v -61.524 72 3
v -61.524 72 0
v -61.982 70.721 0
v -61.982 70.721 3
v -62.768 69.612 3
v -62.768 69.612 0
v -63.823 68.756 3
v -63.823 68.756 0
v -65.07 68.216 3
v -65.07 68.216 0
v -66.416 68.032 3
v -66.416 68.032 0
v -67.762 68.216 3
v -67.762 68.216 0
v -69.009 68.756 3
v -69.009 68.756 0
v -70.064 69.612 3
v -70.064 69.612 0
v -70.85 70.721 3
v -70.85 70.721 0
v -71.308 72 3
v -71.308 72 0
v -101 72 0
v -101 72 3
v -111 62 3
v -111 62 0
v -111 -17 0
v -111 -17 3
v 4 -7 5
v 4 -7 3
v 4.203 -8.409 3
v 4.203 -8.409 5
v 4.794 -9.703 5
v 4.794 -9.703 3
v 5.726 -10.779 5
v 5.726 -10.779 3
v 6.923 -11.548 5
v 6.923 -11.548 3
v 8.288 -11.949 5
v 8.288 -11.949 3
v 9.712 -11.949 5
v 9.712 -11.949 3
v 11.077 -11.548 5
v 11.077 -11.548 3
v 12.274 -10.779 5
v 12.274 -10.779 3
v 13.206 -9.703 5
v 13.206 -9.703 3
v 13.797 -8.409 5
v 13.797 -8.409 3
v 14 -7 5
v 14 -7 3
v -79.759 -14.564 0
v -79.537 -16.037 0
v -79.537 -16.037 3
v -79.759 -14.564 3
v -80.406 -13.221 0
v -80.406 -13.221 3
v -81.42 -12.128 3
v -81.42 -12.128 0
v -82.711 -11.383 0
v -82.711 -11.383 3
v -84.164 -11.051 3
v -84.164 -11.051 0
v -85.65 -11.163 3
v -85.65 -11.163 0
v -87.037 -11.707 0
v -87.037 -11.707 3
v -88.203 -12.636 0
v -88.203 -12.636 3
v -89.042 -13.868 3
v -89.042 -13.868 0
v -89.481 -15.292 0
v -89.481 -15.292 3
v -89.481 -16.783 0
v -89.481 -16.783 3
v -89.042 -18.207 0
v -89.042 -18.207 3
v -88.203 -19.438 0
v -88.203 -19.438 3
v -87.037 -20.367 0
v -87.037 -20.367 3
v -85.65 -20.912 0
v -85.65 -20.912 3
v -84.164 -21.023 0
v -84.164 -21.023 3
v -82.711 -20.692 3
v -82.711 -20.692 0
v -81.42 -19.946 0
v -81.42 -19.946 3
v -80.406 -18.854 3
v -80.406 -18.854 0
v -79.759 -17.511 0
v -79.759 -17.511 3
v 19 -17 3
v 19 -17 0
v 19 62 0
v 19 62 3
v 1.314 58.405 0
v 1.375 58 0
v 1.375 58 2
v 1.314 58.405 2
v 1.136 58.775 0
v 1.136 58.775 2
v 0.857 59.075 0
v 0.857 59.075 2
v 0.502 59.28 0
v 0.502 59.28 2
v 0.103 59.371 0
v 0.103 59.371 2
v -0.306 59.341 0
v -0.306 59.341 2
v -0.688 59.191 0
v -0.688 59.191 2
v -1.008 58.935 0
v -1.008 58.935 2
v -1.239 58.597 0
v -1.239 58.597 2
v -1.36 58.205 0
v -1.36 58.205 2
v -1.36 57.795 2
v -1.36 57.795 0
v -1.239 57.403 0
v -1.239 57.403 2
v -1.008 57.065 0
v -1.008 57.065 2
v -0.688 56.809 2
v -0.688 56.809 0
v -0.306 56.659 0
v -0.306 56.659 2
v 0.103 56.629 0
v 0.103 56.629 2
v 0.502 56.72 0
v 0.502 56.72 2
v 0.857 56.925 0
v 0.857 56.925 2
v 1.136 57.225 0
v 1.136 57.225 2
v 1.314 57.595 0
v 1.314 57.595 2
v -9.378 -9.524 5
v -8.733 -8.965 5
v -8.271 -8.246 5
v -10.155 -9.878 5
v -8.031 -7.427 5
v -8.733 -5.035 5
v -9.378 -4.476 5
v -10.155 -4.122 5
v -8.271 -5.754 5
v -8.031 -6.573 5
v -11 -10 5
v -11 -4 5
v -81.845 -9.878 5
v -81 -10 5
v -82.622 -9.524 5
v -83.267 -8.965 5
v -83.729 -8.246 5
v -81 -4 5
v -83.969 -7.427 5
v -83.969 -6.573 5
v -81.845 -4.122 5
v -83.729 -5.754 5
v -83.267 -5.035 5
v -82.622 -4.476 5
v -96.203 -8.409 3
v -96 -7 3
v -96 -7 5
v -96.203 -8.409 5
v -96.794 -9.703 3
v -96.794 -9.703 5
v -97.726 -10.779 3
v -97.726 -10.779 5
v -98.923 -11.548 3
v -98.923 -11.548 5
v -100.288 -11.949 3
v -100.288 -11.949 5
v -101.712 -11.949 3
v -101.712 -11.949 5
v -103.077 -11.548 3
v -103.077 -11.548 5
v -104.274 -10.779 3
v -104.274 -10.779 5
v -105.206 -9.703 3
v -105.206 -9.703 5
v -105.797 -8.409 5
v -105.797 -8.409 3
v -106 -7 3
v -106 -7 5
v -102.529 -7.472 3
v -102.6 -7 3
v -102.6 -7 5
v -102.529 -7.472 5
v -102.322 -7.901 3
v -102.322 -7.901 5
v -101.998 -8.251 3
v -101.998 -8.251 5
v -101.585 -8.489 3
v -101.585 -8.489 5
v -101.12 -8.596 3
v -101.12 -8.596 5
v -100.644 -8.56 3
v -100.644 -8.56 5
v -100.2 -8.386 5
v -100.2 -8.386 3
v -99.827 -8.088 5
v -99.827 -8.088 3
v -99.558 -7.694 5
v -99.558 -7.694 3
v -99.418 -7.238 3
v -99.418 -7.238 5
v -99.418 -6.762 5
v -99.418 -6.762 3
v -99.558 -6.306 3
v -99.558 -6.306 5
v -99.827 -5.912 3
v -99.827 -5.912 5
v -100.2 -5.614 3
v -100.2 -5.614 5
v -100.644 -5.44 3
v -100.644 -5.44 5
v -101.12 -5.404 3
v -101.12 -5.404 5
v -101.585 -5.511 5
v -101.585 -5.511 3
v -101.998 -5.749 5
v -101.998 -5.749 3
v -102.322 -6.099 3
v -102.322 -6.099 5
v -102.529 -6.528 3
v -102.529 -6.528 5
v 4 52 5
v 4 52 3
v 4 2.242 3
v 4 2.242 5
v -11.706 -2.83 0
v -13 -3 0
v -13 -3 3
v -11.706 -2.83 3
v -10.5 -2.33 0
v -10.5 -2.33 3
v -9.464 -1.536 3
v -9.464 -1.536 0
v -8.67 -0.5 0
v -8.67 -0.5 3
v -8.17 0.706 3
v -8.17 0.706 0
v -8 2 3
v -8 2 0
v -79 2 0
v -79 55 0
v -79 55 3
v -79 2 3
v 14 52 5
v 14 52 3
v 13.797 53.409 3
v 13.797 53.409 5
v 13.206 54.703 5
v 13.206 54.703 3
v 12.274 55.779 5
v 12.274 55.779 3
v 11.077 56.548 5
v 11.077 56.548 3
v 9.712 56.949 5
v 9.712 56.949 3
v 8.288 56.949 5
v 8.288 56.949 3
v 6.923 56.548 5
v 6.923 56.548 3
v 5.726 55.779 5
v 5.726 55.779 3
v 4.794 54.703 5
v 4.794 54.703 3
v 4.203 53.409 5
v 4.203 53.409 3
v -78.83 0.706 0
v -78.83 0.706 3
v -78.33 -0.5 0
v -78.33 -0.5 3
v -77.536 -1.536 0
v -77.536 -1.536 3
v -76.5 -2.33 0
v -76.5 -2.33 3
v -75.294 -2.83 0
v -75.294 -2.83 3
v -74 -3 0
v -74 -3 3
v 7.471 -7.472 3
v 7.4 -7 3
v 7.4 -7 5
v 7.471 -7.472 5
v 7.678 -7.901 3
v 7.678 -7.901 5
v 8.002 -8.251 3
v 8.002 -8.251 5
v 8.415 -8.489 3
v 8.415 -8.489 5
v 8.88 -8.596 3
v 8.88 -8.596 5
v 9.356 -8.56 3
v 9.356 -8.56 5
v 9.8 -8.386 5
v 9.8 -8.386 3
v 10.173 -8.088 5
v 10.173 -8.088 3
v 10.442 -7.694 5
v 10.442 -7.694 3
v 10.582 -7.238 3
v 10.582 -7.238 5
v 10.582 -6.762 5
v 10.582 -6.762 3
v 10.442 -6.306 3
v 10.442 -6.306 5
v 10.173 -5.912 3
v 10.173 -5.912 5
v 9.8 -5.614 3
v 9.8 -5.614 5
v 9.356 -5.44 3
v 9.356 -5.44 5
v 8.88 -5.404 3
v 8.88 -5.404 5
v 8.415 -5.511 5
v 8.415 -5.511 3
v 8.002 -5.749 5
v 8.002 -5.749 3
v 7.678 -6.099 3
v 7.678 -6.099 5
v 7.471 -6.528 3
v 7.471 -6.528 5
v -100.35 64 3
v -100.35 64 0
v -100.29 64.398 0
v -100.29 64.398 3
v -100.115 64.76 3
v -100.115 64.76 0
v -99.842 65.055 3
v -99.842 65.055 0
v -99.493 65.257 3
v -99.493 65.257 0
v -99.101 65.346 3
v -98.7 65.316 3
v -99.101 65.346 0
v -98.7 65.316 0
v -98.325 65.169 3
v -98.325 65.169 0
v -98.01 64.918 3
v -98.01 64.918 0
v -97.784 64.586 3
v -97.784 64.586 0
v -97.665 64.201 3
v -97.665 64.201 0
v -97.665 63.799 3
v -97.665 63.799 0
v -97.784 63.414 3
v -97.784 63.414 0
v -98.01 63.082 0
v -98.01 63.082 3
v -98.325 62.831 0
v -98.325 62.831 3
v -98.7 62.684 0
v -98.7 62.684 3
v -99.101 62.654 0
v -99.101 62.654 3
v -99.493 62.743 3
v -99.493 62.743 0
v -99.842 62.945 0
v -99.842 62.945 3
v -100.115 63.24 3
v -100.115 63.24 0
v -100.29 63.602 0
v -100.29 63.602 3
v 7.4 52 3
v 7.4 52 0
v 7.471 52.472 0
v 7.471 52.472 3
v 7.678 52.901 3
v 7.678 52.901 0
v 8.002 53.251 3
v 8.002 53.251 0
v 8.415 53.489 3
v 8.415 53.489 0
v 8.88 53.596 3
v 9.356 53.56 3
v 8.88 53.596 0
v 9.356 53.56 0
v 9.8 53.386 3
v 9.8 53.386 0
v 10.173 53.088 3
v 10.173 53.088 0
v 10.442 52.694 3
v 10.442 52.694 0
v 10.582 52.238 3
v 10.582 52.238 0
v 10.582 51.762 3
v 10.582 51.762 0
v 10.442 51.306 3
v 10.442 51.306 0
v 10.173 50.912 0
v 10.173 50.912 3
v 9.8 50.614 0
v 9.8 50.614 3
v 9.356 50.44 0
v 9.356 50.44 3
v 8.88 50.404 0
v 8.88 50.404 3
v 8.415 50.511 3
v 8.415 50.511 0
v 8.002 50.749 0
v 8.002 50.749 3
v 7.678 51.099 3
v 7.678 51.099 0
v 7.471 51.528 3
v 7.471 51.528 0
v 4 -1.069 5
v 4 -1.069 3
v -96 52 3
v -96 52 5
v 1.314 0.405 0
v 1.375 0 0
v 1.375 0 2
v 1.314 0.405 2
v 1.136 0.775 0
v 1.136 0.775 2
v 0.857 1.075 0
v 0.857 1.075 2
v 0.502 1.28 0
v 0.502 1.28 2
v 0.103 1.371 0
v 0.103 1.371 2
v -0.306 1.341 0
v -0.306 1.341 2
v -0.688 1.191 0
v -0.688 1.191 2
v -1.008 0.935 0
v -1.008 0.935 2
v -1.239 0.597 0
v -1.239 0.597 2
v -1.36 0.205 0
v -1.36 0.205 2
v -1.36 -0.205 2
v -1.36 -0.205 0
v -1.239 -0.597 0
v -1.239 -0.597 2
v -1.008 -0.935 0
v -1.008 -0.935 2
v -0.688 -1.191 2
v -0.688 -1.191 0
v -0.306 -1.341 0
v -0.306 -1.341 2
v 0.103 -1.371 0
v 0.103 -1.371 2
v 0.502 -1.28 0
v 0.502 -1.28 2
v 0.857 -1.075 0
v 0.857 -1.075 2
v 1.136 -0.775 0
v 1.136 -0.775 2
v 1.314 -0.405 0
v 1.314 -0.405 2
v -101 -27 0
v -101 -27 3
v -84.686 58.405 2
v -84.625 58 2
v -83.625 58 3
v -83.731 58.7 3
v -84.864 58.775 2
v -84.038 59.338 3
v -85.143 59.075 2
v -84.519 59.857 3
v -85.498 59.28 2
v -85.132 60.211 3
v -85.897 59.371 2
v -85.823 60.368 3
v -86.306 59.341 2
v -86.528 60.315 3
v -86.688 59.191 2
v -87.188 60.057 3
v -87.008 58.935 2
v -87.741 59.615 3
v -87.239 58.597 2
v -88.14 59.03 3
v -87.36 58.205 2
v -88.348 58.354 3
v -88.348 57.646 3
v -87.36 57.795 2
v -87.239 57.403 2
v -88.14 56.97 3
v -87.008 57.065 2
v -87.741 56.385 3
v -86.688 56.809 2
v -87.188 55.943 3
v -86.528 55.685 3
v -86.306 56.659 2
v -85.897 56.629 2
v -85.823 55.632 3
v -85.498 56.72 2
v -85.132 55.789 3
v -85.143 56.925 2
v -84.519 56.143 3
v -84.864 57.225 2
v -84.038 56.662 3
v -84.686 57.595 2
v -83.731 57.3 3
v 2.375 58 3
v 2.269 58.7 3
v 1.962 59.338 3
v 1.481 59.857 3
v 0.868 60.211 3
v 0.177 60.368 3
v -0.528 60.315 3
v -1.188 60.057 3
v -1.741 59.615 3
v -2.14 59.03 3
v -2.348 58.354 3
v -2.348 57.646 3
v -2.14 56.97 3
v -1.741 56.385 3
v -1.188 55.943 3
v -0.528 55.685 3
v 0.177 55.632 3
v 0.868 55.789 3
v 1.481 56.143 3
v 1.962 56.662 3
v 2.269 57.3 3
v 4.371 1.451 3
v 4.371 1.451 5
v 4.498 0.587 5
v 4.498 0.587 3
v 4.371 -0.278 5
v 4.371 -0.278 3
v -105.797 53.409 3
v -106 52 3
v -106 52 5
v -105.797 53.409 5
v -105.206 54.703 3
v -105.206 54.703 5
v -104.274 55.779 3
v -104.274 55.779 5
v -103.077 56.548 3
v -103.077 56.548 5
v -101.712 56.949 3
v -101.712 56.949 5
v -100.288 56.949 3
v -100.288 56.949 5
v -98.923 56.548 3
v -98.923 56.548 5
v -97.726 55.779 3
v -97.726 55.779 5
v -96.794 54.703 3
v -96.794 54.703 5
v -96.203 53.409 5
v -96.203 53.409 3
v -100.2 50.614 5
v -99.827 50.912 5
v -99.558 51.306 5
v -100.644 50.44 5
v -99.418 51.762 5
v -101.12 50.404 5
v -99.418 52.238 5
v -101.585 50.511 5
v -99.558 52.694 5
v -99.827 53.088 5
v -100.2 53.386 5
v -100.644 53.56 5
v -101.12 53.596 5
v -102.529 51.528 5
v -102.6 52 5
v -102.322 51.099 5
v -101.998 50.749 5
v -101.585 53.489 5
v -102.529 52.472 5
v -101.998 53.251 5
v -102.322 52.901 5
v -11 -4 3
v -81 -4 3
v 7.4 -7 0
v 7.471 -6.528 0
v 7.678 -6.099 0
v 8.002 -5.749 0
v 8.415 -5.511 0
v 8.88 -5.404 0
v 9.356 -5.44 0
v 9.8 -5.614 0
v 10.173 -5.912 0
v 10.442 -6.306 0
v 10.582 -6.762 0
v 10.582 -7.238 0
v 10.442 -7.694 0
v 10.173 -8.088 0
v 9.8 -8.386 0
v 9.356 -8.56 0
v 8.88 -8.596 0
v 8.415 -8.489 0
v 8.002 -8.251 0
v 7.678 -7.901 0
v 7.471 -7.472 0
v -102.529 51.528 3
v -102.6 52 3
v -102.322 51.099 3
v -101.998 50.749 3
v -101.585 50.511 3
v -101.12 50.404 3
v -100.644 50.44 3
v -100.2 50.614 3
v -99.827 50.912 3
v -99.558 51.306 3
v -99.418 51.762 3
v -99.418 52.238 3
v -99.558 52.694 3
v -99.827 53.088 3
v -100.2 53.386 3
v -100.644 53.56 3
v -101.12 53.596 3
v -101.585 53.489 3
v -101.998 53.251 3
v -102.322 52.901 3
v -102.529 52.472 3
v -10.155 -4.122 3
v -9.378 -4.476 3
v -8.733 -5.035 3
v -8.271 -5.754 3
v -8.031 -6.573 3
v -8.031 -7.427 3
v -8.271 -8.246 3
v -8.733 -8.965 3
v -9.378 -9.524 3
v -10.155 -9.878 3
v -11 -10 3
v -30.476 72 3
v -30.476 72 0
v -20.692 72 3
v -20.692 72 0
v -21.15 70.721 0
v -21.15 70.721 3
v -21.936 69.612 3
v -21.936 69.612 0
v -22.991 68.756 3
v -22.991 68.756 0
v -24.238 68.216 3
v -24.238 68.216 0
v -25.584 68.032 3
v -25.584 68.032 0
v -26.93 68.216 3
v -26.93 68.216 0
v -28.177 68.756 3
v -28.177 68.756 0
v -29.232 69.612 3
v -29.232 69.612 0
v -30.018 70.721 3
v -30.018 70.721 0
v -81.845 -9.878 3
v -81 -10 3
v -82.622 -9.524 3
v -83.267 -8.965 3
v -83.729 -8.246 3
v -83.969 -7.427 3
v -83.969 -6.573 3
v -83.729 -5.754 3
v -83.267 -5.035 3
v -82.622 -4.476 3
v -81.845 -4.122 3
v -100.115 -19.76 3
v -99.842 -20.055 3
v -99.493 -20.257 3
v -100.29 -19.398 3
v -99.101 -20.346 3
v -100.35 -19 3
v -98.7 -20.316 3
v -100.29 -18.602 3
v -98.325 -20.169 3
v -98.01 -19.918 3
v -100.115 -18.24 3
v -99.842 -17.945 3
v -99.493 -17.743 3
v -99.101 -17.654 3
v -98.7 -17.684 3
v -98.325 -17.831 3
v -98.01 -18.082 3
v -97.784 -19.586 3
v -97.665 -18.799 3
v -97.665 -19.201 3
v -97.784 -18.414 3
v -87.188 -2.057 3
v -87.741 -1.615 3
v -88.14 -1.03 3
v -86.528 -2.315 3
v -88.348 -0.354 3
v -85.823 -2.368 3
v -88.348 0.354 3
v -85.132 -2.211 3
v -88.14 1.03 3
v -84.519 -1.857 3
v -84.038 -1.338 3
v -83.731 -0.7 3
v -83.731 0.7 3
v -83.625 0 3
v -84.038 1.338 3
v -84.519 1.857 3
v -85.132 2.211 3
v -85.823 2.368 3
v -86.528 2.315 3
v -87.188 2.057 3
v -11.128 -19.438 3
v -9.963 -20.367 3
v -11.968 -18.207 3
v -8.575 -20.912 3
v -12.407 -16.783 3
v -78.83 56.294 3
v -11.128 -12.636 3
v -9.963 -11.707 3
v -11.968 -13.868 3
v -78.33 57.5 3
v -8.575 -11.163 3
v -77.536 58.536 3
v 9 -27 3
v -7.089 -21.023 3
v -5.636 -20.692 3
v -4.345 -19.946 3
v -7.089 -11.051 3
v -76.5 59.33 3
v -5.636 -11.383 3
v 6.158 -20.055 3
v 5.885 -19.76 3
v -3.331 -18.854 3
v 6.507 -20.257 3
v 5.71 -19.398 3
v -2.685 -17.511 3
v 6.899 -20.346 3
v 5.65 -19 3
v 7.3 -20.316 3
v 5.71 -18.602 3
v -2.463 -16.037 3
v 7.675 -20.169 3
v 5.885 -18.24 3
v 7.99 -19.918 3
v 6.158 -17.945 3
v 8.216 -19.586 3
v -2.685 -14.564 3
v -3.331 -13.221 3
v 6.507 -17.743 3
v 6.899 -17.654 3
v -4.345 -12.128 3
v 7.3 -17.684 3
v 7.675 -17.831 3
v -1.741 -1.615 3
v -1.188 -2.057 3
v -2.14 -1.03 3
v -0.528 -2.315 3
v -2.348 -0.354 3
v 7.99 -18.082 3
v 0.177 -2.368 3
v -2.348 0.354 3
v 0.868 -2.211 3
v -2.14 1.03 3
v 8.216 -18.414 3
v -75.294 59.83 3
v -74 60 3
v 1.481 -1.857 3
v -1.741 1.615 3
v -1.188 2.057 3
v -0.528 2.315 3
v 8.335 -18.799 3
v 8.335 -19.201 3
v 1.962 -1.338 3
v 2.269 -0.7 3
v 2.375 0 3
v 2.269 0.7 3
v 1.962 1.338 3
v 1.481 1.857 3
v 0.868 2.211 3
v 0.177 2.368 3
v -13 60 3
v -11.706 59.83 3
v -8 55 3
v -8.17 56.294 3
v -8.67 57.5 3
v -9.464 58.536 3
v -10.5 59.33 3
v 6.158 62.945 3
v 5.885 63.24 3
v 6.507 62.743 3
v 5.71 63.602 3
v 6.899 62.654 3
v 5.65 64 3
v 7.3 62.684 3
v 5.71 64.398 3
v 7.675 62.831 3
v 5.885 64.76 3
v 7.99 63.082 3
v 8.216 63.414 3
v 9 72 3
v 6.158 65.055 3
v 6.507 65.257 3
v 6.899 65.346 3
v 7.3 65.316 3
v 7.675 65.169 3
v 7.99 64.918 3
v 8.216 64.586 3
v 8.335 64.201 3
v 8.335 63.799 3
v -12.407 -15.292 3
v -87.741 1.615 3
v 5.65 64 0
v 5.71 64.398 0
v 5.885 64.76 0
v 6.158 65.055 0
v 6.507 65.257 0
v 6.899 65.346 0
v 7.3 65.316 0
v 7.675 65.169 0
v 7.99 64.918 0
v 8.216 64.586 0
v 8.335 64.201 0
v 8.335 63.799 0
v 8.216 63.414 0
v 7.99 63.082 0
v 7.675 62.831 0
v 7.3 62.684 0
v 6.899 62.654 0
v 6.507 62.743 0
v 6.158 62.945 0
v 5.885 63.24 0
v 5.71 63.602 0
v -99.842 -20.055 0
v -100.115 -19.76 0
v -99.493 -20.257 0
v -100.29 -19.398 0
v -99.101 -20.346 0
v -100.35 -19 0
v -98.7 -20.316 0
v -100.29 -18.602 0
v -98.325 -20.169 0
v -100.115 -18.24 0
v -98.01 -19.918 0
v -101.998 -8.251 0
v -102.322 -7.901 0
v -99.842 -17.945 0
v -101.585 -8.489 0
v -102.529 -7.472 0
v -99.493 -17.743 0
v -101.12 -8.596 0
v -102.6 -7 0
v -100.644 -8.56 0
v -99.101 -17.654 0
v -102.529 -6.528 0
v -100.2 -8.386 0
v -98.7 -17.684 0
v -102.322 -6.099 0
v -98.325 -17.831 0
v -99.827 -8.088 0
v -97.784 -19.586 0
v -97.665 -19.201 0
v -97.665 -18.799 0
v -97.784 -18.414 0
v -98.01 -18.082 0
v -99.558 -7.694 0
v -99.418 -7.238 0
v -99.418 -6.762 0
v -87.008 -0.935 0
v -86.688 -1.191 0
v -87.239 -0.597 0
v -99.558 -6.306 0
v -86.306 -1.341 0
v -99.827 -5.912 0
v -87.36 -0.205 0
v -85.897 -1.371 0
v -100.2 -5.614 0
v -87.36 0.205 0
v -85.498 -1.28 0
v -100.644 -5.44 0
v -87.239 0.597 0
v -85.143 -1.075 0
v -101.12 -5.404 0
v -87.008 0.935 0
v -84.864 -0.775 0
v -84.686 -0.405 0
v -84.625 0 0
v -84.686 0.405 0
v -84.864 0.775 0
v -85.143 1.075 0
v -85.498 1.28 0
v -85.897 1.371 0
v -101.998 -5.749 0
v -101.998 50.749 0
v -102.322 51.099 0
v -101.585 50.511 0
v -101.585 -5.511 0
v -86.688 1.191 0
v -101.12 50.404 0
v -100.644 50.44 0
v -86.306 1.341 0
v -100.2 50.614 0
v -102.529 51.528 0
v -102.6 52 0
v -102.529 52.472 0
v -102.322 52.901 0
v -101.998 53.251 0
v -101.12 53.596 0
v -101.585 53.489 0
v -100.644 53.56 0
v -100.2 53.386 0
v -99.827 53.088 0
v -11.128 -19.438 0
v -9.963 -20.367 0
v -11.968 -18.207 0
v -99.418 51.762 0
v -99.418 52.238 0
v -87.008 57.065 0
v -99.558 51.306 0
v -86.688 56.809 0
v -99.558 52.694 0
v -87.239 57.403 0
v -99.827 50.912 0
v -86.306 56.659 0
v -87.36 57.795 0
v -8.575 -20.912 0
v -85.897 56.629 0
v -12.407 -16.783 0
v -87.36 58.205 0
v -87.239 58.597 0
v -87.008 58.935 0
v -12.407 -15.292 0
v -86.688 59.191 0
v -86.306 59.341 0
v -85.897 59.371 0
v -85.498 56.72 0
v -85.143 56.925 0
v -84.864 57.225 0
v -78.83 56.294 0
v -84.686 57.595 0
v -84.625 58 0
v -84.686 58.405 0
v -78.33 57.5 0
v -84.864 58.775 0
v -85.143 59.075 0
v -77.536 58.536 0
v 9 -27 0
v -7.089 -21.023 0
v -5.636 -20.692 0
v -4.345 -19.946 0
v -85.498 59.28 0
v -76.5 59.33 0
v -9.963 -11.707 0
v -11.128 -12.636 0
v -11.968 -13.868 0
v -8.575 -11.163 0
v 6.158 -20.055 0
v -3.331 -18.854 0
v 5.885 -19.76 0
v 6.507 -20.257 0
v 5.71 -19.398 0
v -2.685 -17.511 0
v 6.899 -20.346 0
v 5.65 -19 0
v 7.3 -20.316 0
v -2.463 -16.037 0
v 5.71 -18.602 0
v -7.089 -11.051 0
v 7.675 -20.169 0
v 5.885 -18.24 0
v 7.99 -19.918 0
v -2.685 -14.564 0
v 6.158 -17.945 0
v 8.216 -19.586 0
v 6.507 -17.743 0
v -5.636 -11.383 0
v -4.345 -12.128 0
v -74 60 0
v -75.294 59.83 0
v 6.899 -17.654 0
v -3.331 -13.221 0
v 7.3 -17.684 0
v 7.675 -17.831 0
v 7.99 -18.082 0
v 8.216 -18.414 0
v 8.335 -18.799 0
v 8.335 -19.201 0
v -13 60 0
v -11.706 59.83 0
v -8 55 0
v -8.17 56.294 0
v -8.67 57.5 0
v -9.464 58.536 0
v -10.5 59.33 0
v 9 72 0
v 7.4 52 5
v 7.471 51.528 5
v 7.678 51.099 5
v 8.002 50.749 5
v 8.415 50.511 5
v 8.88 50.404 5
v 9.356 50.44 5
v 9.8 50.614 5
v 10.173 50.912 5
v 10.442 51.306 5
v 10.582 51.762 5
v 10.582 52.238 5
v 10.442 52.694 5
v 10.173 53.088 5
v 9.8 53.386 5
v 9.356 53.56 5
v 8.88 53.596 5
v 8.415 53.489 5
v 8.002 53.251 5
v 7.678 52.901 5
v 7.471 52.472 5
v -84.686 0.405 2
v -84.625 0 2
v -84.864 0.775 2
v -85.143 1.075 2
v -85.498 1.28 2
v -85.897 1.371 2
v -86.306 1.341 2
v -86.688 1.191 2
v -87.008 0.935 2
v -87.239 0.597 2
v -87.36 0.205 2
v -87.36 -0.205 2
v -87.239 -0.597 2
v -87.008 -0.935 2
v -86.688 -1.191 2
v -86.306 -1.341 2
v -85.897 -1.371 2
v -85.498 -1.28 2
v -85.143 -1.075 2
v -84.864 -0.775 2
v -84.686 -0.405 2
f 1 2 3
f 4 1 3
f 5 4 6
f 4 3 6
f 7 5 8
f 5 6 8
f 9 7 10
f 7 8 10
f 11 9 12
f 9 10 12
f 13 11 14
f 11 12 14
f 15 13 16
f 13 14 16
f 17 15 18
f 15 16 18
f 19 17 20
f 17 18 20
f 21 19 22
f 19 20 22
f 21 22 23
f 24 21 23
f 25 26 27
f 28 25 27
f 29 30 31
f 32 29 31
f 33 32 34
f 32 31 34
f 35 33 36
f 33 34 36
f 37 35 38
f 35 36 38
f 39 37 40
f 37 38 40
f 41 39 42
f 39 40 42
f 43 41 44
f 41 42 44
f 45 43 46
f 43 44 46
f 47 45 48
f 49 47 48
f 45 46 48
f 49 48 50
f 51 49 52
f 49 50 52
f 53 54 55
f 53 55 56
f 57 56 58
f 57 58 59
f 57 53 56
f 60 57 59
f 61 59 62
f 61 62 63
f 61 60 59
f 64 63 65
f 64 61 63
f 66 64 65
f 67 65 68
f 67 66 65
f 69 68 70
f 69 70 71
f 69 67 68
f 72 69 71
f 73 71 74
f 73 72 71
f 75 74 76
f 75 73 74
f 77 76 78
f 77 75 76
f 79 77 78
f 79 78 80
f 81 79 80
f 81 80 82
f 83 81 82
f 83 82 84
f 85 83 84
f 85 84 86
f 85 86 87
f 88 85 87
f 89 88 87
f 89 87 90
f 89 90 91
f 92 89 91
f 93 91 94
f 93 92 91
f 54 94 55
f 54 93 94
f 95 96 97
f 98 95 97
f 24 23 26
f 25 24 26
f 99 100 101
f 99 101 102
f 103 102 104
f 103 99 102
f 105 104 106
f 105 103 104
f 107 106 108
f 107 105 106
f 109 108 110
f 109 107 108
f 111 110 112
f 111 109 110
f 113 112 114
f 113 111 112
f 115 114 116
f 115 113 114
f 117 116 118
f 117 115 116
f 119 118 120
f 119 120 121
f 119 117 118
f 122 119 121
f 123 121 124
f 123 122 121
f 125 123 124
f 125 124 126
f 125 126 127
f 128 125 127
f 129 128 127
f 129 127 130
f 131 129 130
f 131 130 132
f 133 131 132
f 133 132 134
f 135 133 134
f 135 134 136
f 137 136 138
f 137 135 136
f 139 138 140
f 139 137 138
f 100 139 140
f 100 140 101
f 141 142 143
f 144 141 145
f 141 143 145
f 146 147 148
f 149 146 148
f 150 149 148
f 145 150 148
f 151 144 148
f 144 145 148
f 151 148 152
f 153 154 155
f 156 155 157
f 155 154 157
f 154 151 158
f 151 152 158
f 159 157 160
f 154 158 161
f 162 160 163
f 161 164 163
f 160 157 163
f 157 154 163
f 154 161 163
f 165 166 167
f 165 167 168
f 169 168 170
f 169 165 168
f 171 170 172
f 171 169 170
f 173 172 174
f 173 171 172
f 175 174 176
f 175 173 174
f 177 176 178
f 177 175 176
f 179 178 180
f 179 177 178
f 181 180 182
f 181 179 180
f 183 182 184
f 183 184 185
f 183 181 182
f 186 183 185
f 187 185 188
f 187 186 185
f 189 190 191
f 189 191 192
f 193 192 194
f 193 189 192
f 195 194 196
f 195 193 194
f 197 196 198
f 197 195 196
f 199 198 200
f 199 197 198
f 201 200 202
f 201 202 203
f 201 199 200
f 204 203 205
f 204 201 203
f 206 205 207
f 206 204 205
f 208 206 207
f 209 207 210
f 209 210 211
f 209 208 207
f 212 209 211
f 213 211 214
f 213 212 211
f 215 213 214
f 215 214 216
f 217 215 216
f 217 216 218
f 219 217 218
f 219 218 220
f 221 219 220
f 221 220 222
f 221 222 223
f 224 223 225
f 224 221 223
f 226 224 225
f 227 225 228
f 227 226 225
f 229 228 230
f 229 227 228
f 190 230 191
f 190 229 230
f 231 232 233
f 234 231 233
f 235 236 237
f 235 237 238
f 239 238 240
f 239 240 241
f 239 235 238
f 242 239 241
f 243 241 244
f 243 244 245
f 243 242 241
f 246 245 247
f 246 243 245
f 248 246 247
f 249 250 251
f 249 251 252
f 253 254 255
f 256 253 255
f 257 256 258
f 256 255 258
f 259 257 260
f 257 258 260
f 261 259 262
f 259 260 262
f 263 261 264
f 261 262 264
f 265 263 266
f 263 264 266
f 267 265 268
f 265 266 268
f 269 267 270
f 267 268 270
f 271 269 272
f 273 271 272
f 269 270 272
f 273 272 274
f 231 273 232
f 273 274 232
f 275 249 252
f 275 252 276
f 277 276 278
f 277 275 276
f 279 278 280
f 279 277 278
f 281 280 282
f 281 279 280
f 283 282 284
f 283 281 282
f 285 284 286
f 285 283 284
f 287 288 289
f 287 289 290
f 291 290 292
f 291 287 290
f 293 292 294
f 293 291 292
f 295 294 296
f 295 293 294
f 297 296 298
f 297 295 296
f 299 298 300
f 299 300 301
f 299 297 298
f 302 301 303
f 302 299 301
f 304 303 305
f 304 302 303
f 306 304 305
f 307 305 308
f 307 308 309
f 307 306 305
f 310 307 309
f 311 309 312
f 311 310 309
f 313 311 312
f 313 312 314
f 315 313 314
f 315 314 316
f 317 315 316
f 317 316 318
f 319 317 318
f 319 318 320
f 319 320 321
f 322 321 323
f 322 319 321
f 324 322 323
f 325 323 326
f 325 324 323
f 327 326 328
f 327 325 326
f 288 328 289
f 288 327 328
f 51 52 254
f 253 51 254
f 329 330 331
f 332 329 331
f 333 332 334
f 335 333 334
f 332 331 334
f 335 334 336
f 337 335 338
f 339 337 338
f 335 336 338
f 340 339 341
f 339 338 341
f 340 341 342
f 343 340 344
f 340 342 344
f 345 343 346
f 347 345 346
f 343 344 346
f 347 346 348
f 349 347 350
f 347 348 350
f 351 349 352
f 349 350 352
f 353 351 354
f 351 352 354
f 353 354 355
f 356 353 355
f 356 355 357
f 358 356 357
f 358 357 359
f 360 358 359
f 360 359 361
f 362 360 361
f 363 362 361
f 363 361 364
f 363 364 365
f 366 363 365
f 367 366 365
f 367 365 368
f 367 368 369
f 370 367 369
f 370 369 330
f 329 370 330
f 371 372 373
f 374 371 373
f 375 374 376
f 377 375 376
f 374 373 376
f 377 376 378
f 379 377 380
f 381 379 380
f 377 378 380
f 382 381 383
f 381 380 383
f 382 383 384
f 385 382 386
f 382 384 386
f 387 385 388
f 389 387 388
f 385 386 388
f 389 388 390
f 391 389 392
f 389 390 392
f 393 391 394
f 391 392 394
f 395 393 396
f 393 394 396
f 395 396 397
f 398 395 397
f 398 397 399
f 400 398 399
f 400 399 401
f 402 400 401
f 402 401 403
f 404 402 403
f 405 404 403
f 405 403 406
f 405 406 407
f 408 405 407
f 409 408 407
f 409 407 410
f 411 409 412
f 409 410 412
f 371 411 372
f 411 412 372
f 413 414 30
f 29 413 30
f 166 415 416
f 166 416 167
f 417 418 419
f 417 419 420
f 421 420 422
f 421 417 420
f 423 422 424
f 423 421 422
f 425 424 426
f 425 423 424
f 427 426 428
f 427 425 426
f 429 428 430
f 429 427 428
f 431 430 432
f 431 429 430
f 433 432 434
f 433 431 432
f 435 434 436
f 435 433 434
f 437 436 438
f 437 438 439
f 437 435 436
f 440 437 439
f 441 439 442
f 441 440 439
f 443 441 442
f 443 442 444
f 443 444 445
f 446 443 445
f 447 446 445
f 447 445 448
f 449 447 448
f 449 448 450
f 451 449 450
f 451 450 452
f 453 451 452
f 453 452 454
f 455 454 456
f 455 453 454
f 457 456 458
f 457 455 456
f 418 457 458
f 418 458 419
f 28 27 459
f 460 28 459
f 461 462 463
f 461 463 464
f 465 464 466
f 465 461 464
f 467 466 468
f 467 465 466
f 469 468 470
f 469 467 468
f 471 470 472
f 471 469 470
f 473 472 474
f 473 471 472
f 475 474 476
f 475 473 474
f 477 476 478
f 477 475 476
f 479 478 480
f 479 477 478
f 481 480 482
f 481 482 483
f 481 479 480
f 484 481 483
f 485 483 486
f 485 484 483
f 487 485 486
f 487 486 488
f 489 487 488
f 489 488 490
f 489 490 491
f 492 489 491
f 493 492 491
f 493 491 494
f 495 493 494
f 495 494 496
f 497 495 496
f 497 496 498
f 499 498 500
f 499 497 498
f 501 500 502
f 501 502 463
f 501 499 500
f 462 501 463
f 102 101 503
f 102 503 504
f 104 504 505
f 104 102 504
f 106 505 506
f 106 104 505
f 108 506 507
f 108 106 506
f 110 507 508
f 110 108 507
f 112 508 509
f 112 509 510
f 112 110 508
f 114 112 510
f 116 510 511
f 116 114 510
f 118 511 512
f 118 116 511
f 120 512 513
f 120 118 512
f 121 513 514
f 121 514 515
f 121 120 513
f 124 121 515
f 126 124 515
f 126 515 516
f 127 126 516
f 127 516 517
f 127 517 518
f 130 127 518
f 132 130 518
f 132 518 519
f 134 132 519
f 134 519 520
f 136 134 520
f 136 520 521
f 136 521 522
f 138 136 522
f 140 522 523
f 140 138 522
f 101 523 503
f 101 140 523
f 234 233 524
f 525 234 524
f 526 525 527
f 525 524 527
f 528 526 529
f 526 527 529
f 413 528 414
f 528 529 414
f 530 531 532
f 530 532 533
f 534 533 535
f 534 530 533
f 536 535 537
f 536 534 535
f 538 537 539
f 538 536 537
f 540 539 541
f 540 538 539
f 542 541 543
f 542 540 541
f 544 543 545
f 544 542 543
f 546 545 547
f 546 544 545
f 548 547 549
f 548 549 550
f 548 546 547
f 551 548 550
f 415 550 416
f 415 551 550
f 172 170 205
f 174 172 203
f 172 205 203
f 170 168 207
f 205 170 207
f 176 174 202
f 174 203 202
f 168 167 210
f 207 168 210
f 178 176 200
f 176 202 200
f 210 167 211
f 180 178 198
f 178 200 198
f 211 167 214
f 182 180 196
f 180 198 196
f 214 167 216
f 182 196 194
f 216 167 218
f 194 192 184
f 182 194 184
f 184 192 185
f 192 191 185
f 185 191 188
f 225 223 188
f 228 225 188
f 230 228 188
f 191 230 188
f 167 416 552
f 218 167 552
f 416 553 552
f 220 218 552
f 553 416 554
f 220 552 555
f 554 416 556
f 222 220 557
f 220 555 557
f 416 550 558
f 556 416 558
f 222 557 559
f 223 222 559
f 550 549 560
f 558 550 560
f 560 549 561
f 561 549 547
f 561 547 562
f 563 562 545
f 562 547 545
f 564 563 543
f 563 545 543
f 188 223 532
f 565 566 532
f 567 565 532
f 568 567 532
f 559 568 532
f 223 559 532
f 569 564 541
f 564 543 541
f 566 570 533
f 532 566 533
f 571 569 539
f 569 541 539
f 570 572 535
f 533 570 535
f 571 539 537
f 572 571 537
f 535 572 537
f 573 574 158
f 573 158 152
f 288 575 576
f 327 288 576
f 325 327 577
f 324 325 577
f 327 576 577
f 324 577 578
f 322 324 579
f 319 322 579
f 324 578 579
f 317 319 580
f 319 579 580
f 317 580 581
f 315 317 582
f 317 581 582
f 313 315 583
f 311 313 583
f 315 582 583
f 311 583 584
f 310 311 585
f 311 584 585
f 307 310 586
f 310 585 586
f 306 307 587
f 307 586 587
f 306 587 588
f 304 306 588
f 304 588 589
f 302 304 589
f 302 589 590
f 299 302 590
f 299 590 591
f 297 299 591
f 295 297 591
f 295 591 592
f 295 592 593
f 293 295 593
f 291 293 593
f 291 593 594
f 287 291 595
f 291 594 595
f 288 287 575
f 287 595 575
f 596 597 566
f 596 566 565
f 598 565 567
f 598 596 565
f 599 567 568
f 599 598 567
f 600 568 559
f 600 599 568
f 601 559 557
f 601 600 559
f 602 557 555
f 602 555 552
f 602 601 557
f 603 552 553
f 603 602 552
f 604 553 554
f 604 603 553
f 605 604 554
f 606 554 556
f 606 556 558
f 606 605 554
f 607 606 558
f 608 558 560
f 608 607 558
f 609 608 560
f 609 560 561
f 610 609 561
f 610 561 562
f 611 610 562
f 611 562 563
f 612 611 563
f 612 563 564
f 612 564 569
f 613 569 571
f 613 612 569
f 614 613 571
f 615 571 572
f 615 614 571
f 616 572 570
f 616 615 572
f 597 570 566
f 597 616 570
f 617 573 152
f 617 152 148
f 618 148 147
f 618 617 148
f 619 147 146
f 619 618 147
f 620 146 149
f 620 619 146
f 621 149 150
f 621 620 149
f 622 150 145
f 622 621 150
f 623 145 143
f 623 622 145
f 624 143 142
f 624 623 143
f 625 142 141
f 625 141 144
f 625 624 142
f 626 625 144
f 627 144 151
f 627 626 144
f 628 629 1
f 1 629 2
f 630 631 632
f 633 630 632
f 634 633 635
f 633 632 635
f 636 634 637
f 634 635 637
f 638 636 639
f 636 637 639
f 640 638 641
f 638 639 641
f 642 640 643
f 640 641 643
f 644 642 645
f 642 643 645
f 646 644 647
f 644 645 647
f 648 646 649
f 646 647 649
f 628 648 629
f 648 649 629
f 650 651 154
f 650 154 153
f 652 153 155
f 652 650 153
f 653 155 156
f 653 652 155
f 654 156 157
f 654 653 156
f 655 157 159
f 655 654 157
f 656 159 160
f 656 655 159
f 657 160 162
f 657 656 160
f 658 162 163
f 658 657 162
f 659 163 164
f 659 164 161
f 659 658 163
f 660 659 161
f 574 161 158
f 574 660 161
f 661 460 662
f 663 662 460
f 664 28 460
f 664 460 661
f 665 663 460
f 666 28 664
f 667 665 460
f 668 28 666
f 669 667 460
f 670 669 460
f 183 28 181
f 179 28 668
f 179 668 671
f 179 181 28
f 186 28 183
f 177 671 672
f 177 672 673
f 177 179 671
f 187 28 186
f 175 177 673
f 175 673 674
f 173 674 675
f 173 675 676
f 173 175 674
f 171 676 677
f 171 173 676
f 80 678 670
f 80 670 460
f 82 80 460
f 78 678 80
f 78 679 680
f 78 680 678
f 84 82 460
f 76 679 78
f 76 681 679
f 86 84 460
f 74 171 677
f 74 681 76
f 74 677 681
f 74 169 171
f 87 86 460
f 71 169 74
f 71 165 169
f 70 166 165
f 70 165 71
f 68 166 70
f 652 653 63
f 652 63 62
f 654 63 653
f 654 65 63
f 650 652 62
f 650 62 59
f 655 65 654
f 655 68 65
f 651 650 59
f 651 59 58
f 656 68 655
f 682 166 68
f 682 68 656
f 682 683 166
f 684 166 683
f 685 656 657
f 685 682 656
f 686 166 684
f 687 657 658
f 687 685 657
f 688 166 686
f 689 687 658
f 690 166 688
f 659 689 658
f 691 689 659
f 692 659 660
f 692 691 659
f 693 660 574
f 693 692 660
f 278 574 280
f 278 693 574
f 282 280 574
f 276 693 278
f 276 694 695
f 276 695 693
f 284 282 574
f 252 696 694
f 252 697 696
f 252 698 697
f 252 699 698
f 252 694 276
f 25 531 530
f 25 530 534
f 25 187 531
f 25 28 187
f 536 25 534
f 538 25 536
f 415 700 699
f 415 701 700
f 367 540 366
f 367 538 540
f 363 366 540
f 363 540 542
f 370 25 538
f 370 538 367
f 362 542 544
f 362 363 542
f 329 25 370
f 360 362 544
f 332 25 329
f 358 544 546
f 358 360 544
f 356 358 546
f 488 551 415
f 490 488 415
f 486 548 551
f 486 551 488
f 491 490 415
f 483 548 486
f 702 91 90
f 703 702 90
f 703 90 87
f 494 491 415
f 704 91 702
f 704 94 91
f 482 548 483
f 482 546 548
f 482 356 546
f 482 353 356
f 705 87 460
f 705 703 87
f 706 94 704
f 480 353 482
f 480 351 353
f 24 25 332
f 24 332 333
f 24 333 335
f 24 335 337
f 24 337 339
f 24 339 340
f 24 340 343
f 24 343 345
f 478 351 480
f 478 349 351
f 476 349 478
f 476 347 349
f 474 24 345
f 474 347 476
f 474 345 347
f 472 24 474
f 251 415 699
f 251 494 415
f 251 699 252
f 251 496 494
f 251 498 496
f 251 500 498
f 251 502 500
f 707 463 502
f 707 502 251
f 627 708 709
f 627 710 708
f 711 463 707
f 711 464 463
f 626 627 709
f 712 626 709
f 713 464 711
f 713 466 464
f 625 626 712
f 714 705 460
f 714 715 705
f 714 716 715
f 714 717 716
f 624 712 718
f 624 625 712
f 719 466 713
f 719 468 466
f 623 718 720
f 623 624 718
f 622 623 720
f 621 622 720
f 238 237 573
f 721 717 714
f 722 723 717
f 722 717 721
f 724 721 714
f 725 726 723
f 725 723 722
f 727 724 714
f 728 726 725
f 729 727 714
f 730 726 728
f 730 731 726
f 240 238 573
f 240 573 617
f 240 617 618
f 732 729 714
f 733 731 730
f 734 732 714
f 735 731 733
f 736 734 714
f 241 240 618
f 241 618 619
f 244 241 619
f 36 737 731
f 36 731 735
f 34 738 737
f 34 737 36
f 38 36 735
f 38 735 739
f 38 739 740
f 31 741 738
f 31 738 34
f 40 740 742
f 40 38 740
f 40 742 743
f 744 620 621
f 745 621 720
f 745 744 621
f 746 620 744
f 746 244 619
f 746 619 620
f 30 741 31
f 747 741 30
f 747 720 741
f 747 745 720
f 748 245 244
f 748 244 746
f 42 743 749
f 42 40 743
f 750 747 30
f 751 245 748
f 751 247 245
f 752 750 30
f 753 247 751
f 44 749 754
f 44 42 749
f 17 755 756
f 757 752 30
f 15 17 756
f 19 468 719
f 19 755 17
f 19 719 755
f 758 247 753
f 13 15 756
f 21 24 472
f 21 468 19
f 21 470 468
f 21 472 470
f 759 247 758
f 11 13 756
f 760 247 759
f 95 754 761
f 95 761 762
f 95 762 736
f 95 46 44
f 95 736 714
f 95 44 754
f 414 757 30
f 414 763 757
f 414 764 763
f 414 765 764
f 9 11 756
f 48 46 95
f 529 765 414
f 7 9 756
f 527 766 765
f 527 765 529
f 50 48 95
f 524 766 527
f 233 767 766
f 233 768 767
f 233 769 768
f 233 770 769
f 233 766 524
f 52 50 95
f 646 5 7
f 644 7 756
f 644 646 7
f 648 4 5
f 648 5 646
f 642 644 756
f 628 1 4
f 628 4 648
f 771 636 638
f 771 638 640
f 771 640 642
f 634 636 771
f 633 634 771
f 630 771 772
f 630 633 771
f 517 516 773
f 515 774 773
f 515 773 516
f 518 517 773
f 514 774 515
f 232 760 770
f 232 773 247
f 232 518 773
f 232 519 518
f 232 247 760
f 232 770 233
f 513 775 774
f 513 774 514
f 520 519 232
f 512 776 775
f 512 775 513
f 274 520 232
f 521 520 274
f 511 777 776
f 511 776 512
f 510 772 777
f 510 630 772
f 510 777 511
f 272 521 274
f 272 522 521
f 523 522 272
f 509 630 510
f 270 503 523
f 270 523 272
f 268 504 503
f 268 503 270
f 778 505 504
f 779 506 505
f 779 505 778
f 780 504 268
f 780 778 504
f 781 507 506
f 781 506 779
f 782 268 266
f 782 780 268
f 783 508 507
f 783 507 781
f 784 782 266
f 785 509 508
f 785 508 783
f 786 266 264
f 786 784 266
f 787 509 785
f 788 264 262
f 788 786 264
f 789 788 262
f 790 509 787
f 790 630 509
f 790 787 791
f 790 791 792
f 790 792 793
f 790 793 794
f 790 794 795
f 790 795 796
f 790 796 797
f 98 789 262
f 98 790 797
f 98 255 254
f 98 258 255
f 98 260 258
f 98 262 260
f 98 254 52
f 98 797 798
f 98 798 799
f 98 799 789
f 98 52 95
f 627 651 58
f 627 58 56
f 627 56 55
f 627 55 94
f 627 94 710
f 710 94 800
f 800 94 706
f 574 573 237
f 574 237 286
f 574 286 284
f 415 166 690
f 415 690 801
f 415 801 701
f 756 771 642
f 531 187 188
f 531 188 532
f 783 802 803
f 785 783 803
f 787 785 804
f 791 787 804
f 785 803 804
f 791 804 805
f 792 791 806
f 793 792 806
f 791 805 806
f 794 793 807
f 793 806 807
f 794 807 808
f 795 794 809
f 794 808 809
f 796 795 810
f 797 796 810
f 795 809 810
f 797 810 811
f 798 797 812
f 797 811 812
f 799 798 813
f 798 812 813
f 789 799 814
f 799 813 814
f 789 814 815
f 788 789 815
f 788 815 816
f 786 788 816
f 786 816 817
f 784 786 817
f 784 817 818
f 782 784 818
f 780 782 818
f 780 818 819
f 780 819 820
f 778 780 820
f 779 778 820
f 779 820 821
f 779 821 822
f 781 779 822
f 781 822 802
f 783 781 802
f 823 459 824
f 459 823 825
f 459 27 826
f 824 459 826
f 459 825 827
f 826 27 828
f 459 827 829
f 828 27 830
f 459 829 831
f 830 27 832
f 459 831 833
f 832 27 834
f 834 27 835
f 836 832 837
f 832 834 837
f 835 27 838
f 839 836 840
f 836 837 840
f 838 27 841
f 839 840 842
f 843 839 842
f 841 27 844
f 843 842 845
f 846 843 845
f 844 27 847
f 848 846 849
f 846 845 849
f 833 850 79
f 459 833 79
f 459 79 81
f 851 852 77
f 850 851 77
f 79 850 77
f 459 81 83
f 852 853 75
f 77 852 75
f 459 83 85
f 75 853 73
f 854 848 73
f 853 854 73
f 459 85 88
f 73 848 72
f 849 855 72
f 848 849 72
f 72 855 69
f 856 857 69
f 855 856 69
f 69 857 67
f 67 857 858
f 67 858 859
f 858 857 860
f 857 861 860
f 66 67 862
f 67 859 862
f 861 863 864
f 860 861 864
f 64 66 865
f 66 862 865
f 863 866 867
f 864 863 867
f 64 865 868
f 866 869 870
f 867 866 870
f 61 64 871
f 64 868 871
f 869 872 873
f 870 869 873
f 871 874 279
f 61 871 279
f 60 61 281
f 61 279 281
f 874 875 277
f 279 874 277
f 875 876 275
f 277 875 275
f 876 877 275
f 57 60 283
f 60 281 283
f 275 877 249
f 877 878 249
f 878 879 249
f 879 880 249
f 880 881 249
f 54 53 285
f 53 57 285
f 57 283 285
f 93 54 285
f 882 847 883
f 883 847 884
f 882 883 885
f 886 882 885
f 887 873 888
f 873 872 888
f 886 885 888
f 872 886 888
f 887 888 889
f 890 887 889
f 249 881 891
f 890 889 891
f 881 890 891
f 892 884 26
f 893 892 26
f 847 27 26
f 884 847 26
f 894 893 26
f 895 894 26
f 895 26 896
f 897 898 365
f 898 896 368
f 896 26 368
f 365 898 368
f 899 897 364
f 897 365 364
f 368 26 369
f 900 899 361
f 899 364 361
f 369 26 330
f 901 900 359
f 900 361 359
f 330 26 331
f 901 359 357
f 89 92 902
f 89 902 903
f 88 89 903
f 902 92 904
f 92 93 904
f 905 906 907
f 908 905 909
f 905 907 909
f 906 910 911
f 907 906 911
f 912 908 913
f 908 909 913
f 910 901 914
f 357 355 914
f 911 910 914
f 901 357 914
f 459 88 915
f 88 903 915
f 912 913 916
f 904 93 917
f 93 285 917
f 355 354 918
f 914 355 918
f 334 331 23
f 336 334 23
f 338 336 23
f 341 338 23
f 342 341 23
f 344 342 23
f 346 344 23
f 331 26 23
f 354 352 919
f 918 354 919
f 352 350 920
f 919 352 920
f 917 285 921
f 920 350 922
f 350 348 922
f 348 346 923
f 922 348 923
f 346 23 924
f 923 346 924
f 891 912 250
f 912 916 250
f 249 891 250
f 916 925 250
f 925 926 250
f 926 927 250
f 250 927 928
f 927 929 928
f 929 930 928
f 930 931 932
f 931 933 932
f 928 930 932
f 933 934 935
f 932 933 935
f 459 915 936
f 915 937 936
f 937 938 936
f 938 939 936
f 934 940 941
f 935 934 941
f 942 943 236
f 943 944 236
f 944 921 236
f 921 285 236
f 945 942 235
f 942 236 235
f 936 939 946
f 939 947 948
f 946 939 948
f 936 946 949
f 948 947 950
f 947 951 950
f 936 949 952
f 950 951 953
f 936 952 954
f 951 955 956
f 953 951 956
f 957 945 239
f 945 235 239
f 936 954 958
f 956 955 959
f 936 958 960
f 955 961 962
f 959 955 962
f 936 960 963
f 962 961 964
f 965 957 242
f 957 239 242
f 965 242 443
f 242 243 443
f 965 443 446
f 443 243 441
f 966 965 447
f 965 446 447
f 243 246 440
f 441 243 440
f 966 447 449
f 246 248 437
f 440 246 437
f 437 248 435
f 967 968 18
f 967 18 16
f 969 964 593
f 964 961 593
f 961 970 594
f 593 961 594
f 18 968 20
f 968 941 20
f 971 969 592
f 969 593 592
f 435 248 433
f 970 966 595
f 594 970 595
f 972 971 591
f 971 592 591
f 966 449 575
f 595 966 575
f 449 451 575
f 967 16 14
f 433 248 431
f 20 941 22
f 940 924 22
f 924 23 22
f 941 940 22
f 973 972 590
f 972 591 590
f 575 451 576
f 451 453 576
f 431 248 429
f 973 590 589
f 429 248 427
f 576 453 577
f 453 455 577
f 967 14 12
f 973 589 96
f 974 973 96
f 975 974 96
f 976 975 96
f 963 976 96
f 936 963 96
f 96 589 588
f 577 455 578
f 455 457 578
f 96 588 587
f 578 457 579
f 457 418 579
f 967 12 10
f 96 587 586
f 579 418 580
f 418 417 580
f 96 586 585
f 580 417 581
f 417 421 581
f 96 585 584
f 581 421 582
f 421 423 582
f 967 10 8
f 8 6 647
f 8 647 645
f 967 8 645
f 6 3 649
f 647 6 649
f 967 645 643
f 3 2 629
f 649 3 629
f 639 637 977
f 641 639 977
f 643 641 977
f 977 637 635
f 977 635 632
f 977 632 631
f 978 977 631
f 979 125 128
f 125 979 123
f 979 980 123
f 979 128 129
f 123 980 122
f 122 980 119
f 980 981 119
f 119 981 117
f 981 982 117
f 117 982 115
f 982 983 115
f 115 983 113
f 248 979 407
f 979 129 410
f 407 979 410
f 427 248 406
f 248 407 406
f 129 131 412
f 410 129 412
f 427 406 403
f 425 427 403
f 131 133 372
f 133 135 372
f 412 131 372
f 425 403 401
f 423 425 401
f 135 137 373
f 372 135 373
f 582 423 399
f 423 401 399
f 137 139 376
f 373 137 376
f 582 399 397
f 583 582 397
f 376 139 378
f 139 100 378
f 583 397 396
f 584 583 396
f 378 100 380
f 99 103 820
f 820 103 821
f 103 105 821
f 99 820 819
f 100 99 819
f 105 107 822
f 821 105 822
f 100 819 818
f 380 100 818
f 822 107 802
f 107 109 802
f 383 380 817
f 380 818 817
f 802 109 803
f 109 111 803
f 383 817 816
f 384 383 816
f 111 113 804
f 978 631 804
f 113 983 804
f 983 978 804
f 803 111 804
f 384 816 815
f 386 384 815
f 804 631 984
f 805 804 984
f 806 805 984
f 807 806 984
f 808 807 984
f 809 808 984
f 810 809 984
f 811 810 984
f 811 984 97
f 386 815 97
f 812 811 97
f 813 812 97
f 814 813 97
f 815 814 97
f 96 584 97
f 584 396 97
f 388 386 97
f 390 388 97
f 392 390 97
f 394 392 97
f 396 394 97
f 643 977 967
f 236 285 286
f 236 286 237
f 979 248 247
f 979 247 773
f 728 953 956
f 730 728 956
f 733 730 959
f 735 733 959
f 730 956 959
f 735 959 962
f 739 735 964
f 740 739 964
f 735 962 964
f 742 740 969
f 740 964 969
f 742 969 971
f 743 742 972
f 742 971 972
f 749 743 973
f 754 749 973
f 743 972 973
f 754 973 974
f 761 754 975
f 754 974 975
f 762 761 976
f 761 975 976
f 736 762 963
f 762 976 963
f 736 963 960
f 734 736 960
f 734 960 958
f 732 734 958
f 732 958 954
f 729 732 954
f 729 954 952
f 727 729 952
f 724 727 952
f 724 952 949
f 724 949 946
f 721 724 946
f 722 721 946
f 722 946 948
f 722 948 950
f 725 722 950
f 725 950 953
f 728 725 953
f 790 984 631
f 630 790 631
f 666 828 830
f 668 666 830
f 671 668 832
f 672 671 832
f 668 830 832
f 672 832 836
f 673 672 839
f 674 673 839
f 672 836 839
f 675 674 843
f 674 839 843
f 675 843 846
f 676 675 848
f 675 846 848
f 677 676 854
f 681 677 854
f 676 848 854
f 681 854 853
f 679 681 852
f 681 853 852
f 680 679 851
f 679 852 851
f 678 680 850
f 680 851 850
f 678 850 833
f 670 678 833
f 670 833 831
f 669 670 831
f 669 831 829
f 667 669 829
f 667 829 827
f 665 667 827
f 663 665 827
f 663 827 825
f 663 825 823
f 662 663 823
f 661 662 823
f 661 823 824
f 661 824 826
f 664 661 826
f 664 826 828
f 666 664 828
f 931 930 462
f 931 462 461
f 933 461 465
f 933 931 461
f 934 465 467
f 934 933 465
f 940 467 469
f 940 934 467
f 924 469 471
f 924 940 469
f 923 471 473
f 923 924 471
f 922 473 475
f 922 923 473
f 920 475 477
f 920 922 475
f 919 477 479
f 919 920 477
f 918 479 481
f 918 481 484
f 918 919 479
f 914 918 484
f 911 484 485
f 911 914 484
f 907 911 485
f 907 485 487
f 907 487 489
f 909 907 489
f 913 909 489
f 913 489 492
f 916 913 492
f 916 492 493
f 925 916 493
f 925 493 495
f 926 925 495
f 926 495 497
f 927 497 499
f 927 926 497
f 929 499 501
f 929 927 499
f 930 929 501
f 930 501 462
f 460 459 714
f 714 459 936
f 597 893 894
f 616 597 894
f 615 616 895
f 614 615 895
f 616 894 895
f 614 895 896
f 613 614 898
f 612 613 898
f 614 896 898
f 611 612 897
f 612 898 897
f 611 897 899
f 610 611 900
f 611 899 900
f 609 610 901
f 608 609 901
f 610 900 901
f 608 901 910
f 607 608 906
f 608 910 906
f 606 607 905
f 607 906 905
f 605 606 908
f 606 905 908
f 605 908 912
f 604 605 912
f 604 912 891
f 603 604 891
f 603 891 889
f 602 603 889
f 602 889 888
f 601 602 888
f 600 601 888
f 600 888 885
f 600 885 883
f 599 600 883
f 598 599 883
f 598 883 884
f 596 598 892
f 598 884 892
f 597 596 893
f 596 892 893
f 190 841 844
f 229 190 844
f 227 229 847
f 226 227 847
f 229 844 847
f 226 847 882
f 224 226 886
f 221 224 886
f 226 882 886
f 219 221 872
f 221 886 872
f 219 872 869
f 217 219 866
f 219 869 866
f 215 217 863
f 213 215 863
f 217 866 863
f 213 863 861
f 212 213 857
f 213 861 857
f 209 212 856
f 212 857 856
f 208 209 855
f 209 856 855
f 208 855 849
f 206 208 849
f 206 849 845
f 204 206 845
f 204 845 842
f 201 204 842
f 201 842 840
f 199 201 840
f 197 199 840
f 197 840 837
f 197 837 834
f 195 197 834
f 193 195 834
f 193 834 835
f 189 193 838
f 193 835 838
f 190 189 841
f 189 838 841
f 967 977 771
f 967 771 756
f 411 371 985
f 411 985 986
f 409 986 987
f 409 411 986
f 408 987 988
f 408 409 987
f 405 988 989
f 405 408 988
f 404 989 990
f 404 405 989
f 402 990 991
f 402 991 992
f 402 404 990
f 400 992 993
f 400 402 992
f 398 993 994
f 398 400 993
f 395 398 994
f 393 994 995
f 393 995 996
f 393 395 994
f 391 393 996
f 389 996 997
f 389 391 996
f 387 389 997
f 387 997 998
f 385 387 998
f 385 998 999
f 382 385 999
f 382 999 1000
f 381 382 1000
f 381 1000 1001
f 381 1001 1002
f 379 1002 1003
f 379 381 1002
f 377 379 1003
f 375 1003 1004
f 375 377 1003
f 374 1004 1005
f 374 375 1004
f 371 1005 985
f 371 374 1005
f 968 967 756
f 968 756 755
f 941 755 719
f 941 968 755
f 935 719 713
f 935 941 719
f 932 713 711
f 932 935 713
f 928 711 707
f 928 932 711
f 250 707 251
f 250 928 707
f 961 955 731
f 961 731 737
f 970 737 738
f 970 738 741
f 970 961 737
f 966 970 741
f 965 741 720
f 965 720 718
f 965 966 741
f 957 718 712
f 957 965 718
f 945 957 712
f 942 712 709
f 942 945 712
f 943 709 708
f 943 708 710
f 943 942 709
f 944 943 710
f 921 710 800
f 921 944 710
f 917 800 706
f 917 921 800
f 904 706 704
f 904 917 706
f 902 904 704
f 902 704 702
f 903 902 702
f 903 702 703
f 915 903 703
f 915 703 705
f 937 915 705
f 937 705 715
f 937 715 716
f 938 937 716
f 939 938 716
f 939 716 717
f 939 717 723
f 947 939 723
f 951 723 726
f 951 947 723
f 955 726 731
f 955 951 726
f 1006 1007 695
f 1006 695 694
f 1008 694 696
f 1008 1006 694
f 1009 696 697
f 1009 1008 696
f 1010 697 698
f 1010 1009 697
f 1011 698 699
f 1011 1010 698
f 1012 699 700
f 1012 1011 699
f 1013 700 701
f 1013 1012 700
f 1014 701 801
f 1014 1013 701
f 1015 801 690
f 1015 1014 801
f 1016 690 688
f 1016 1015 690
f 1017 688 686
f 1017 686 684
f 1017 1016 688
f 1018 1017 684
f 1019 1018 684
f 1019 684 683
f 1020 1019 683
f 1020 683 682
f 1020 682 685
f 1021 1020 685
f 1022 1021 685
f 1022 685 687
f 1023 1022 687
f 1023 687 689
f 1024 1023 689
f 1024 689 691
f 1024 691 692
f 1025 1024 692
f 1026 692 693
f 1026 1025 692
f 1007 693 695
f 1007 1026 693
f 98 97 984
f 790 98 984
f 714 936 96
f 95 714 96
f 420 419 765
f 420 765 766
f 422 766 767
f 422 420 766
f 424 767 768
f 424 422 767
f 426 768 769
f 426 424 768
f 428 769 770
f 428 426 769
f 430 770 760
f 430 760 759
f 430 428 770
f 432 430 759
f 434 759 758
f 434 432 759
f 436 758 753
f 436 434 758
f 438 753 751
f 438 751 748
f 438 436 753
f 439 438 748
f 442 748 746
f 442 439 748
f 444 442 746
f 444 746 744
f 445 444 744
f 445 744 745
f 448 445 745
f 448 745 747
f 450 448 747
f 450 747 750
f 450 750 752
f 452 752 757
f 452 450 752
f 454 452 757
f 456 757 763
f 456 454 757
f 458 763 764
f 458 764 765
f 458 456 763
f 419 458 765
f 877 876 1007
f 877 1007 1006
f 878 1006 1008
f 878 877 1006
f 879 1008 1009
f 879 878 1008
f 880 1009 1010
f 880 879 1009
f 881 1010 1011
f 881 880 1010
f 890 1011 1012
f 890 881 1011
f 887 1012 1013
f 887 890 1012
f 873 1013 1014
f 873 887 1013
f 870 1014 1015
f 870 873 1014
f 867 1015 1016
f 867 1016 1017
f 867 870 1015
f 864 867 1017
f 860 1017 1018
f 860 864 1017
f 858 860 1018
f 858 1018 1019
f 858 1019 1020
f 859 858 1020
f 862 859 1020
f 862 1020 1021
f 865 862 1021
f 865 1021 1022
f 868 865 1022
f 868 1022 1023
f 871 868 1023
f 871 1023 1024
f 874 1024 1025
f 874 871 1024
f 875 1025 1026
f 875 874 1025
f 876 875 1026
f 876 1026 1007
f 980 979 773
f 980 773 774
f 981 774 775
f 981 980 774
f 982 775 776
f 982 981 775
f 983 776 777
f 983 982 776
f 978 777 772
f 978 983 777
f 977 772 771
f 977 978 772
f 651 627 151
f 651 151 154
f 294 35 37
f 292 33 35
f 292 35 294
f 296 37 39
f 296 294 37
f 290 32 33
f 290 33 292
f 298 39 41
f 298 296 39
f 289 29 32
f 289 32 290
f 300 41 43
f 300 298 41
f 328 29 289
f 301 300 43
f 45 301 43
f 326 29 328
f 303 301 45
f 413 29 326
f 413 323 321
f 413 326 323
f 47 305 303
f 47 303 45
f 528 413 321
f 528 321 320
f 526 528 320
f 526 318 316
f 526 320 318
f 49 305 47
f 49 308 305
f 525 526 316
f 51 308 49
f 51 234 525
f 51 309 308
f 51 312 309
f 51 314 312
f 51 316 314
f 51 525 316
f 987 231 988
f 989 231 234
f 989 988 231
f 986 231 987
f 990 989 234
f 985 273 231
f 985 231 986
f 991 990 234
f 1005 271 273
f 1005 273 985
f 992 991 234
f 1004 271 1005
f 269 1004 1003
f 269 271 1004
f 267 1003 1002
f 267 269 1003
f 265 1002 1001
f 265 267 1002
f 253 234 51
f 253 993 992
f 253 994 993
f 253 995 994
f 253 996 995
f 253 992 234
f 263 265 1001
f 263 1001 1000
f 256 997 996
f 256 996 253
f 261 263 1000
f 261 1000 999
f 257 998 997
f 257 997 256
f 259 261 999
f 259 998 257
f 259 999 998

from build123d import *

# Parameters (mm, degrees)
SKETCH1_R          = 1.375
SKETCH1_R_2        = 5
EXTRUDE1_DEPTH     = 3
SKETCH2_R          = 1.6
CUT_EXTRUDE1_DEPTH = 3
SKETCH3_R          = 1.6
EXTRUDE2_DEPTH     = 2
EXTRUDE3_DEPTH     = 2
SKETCH5_R          = 1.35
CUT_EXTRUDE2_DEPTH = 5
CHAMFER1_SIZE      = 1


with BuildPart() as part:
    # Sketch1 → Extrude1 (new body)
    with BuildSketch(Plane.XY):
        with BuildLine():
            Line((9, 72), (-20.691500947, 72))
            ThreePointArc((-20.691500947, 72), (-25.583940659, 68.031520074), (-30.476380371, 72))
            Line((-30.476380371, 72), (-61.523619629, 72))
            ThreePointArc((-61.523619629, 72), (-66.416059341, 68.031520074), (-71.308499053, 72))
            Line((-71.308499053, 72), (-101, 72))
            Line((-101, 72), (-111, 62))
            Line((-111, 62), (-111, -17))
            Line((-111, -17), (-101, -27))
            Line((-101, -27), (9, -27))
            Line((9, -27), (19, -17))
            Line((19, -17), (19, 62))
            Line((19, 62), (9, 72))
        make_face()
        with Locations((-86, 0)):
            Circle(SKETCH1_R, mode=Mode.SUBTRACT)
        with Locations((-86, 58)):
            Circle(SKETCH1_R, mode=Mode.SUBTRACT)
        Circle(SKETCH1_R, mode=Mode.SUBTRACT)
        with Locations((0, 58)):
            Circle(SKETCH1_R, mode=Mode.SUBTRACT)
        with Locations((-7.462680425, -16.037319575)):
            Circle(SKETCH1_R_2, mode=Mode.SUBTRACT)
        with Locations((-84.537319575, -16.037319575)):
            Circle(SKETCH1_R_2, mode=Mode.SUBTRACT)
    extrude(amount=EXTRUDE1_DEPTH)

    # Sketch2 → Cut-Extrude1 (cut)
    with BuildSketch(Plane(origin=(0, 0, 0), x_dir=(-1, 0, 0), z_dir=(0, 0, -1))):
        with Locations((-9, 52)):
            Circle(SKETCH2_R)
        with Locations((-9, -7)):
            Circle(SKETCH2_R)
        with Locations((101, 52)):
            Circle(SKETCH2_R)
        with Locations((101, -7)):
            Circle(SKETCH2_R)
        with BuildLine():
            Line((13, 60), (74, 60))
            ThreePointArc((74, 60), (77.535533906, 58.535533906), (79, 55))
            Line((79, 55), (79, 2))
            ThreePointArc((79, 2), (77.535533906, -1.535533906), (74, -3))
            Line((74, -3), (13, -3))
            ThreePointArc((13, -3), (9.464466094, -1.535533906), (8, 2))
            Line((8, 2), (8, 55))
            ThreePointArc((8, 55), (9.464466094, 58.535533906), (13, 60))
        make_face()
    extrude(amount=-CUT_EXTRUDE1_DEPTH, mode=Mode.SUBTRACT)

    # Sketch3 → Extrude2 (add)
    # profile 1 of 2: a face of its own
    with BuildSketch(Plane.XY.offset(3)):
        with BuildLine():
            Line((4, -1.068897687), (4, -7))
            ThreePointArc((4, -7), (9, -12), (14, -7))
            Line((14, -7), (14, 52))
            ThreePointArc((14, 52), (9, 57), (4, 52))
            Line((4, 52), (4, 2.241917312))
            ThreePointArc((4, 2.241917312), (4.498075539, 0.586509812), (4, -1.068897687))
        make_face()
        with Locations(Location((9, -7, 0), (0, 0, 180))):
            Circle(SKETCH3_R, mode=Mode.SUBTRACT)
        with Locations(Location((9, 52, 0), (0, 0, 180))):
            Circle(SKETCH3_R, mode=Mode.SUBTRACT)
    # profile 2 of 2: a face of its own
    with BuildSketch(Plane.XY.offset(3)):
        with BuildLine():
            Line((-96, 52), (-96, -7))
            ThreePointArc((-96, -7), (-101, -12), (-106, -7))
            Line((-106, -7), (-106, 52))
            ThreePointArc((-106, 52), (-101, 57), (-96, 52))
        make_face()
        with Locations(Location((-101, -7, 0), (0, 0, 180))):
            Circle(SKETCH3_R, mode=Mode.SUBTRACT)
        with Locations(Location((-101, 52, 0), (0, 0, 180))):
            Circle(SKETCH3_R, mode=Mode.SUBTRACT)
    extrude(amount=EXTRUDE2_DEPTH)

    # Sketch4 → Extrude3 (add)
    with BuildSketch(Plane.XY.offset(3)):
        with BuildLine():
            Line((-11, -10), (-81, -10))
            ThreePointArc((-81, -10), (-84, -7), (-81, -4))
            Line((-81, -4), (-11, -4))
            ThreePointArc((-11, -4), (-8, -7), (-11, -10))
        make_face()
    extrude(amount=EXTRUDE3_DEPTH)

    # Sketch5 → Cut-Extrude2 (cut)
    with BuildSketch(Plane(origin=(0, 0, 0), x_dir=(-1, 0, 0), z_dir=(0, 0, -1))):
        with Locations((-7, 64)):
            Circle(SKETCH5_R)
        with Locations((99, 64)):
            Circle(SKETCH5_R)
        with Locations((99, -19)):
            Circle(SKETCH5_R)
        with Locations((-7, -19)):
            Circle(SKETCH5_R)
    extrude(amount=-CUT_EXTRUDE2_DEPTH, mode=Mode.SUBTRACT)

    # Chamfer1
    chamfer1_edges = [part.edges().sort_by_distance(p)[0] for p in [
        (-87.375, 0, 3),
        (-87.375, 58, 3),
        (-1.375, 0, 3),
        (-1.375, 58, 3),
    ]]
    chamfer(chamfer1_edges, length=CHAMFER1_SIZE)


solid = part.part
